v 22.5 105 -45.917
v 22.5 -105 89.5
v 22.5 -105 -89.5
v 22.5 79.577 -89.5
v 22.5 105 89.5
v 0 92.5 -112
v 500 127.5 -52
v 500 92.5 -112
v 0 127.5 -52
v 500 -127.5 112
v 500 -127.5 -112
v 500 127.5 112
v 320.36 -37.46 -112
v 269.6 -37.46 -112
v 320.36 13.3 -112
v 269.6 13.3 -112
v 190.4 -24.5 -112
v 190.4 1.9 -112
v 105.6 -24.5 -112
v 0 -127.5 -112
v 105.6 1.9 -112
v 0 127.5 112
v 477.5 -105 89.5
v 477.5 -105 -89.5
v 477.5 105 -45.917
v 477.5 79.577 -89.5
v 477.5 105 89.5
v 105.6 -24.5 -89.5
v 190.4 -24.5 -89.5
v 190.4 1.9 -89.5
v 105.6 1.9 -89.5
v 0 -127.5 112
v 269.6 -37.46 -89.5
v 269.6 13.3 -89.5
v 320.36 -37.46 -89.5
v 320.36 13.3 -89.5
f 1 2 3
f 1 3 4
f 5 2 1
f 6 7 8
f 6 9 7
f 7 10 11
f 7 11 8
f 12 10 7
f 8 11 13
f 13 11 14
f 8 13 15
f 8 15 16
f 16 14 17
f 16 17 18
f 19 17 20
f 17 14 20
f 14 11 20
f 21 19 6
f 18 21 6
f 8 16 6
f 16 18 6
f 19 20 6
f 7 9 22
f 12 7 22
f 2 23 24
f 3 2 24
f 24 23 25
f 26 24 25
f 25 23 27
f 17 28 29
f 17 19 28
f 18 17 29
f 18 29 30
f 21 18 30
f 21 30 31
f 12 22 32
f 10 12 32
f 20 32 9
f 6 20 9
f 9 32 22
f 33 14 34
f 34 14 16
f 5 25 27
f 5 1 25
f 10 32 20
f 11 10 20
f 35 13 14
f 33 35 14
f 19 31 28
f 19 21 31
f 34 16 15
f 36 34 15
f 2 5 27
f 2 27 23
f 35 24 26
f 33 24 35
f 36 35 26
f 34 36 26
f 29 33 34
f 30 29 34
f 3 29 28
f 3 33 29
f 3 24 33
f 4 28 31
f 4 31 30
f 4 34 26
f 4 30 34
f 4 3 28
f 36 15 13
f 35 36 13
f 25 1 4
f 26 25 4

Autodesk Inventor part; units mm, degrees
ref_plane "YZ Plane" through (0, 0, 0) normal (1, 0, 0) x (0, 1, 0)
ref_plane "XZ Plane" through (0, 0, 0) normal (0, 1, 0) x (-1, 0, 0)
ref_plane "XY Plane" through (0, 0, 0) normal (0, 0, 1) x (1, 0, 0)
sketch "Sketch1" plane through (0, 0, 0) normal (1, 0, 0) x (0, 1, 0)
  point P0 (0, 0)
sketch "Sketch2" plane through (0, 0, 0) normal (1, 0, 0) x (0, 1, 0)
  line L0 (-127.5, -112) -> (127.5, -112)
  line L1 (127.5, -112) -> (127.5, 112)
  line L2 (127.5, 112) -> (-127.5, 112)
  line L3 (-127.5, 112) -> (-127.5, -112)
  line L4 (-127.5, -112) -> (127.5, 112) construction
  line L5 (127.5, -112) -> (-127.5, 112) construction
  line L6 (127.5, -52) -> (92.5, -112)
  point P0 (0, 0)
  dimension "d0" = 255
  dimension "d1" = 224
  dimension "d2" = 35
  dimension "d3" = 60
extrude "Extrusion1" add sketch "Sketch2" along normal blind 500 contours L3 L2 L1 L6 L0
shell "Shell1" thickness 22.5 removed faces 0
ref_plane "Work Plane1" through (0, -127.5, -100.75) normal (0, 0, -1) x (-1, 0, 0)
sketch "Sketch3" plane through (0, -127.5, -112) normal (0, 0, -1) x (-1, 0, 0)
  line L0 (-105.6, 103) -> (-190.4, 103)
  line L1 (-190.4, 103) -> (-190.4, 129.4)
  line L2 (-190.4, 129.4) -> (-105.6, 129.4)
  line L3 (-105.6, 129.4) -> (-105.6, 103)
  point P0 (0, 127.5)
  dimension "d7" = 84.8
  dimension "d8" = 26.4
extrude "Extrusion2" cut sketch "Sketch3" against normal blind 201.5
sketch "Sketch4" plane through (0, -127.5, -112) normal (0, 0, -1) x (-1, 0, 0)
  line L0 (-269.6, 140.8) -> (-320.36, 140.8)
  line L1 (-320.36, 140.8) -> (-320.36, 90.04)
  line L2 (-320.36, 90.04) -> (-269.6, 90.04)
  line L3 (-269.6, 90.04) -> (-269.6, 140.8)
  line L4 (0, 220) -> (-500, 220) projected
  line L5 (-190.4, 103) -> (-190.4, 129.4) projected
  point P0 (0, 127.5)
  dimension "d11" = 50.76
  dimension "d12" = 50.76
  dimension "d13" = 79.2
  dimension "d14" = 79.2
extrude "Extrusion3" cut sketch "Sketch4" against normal blind 201.5
